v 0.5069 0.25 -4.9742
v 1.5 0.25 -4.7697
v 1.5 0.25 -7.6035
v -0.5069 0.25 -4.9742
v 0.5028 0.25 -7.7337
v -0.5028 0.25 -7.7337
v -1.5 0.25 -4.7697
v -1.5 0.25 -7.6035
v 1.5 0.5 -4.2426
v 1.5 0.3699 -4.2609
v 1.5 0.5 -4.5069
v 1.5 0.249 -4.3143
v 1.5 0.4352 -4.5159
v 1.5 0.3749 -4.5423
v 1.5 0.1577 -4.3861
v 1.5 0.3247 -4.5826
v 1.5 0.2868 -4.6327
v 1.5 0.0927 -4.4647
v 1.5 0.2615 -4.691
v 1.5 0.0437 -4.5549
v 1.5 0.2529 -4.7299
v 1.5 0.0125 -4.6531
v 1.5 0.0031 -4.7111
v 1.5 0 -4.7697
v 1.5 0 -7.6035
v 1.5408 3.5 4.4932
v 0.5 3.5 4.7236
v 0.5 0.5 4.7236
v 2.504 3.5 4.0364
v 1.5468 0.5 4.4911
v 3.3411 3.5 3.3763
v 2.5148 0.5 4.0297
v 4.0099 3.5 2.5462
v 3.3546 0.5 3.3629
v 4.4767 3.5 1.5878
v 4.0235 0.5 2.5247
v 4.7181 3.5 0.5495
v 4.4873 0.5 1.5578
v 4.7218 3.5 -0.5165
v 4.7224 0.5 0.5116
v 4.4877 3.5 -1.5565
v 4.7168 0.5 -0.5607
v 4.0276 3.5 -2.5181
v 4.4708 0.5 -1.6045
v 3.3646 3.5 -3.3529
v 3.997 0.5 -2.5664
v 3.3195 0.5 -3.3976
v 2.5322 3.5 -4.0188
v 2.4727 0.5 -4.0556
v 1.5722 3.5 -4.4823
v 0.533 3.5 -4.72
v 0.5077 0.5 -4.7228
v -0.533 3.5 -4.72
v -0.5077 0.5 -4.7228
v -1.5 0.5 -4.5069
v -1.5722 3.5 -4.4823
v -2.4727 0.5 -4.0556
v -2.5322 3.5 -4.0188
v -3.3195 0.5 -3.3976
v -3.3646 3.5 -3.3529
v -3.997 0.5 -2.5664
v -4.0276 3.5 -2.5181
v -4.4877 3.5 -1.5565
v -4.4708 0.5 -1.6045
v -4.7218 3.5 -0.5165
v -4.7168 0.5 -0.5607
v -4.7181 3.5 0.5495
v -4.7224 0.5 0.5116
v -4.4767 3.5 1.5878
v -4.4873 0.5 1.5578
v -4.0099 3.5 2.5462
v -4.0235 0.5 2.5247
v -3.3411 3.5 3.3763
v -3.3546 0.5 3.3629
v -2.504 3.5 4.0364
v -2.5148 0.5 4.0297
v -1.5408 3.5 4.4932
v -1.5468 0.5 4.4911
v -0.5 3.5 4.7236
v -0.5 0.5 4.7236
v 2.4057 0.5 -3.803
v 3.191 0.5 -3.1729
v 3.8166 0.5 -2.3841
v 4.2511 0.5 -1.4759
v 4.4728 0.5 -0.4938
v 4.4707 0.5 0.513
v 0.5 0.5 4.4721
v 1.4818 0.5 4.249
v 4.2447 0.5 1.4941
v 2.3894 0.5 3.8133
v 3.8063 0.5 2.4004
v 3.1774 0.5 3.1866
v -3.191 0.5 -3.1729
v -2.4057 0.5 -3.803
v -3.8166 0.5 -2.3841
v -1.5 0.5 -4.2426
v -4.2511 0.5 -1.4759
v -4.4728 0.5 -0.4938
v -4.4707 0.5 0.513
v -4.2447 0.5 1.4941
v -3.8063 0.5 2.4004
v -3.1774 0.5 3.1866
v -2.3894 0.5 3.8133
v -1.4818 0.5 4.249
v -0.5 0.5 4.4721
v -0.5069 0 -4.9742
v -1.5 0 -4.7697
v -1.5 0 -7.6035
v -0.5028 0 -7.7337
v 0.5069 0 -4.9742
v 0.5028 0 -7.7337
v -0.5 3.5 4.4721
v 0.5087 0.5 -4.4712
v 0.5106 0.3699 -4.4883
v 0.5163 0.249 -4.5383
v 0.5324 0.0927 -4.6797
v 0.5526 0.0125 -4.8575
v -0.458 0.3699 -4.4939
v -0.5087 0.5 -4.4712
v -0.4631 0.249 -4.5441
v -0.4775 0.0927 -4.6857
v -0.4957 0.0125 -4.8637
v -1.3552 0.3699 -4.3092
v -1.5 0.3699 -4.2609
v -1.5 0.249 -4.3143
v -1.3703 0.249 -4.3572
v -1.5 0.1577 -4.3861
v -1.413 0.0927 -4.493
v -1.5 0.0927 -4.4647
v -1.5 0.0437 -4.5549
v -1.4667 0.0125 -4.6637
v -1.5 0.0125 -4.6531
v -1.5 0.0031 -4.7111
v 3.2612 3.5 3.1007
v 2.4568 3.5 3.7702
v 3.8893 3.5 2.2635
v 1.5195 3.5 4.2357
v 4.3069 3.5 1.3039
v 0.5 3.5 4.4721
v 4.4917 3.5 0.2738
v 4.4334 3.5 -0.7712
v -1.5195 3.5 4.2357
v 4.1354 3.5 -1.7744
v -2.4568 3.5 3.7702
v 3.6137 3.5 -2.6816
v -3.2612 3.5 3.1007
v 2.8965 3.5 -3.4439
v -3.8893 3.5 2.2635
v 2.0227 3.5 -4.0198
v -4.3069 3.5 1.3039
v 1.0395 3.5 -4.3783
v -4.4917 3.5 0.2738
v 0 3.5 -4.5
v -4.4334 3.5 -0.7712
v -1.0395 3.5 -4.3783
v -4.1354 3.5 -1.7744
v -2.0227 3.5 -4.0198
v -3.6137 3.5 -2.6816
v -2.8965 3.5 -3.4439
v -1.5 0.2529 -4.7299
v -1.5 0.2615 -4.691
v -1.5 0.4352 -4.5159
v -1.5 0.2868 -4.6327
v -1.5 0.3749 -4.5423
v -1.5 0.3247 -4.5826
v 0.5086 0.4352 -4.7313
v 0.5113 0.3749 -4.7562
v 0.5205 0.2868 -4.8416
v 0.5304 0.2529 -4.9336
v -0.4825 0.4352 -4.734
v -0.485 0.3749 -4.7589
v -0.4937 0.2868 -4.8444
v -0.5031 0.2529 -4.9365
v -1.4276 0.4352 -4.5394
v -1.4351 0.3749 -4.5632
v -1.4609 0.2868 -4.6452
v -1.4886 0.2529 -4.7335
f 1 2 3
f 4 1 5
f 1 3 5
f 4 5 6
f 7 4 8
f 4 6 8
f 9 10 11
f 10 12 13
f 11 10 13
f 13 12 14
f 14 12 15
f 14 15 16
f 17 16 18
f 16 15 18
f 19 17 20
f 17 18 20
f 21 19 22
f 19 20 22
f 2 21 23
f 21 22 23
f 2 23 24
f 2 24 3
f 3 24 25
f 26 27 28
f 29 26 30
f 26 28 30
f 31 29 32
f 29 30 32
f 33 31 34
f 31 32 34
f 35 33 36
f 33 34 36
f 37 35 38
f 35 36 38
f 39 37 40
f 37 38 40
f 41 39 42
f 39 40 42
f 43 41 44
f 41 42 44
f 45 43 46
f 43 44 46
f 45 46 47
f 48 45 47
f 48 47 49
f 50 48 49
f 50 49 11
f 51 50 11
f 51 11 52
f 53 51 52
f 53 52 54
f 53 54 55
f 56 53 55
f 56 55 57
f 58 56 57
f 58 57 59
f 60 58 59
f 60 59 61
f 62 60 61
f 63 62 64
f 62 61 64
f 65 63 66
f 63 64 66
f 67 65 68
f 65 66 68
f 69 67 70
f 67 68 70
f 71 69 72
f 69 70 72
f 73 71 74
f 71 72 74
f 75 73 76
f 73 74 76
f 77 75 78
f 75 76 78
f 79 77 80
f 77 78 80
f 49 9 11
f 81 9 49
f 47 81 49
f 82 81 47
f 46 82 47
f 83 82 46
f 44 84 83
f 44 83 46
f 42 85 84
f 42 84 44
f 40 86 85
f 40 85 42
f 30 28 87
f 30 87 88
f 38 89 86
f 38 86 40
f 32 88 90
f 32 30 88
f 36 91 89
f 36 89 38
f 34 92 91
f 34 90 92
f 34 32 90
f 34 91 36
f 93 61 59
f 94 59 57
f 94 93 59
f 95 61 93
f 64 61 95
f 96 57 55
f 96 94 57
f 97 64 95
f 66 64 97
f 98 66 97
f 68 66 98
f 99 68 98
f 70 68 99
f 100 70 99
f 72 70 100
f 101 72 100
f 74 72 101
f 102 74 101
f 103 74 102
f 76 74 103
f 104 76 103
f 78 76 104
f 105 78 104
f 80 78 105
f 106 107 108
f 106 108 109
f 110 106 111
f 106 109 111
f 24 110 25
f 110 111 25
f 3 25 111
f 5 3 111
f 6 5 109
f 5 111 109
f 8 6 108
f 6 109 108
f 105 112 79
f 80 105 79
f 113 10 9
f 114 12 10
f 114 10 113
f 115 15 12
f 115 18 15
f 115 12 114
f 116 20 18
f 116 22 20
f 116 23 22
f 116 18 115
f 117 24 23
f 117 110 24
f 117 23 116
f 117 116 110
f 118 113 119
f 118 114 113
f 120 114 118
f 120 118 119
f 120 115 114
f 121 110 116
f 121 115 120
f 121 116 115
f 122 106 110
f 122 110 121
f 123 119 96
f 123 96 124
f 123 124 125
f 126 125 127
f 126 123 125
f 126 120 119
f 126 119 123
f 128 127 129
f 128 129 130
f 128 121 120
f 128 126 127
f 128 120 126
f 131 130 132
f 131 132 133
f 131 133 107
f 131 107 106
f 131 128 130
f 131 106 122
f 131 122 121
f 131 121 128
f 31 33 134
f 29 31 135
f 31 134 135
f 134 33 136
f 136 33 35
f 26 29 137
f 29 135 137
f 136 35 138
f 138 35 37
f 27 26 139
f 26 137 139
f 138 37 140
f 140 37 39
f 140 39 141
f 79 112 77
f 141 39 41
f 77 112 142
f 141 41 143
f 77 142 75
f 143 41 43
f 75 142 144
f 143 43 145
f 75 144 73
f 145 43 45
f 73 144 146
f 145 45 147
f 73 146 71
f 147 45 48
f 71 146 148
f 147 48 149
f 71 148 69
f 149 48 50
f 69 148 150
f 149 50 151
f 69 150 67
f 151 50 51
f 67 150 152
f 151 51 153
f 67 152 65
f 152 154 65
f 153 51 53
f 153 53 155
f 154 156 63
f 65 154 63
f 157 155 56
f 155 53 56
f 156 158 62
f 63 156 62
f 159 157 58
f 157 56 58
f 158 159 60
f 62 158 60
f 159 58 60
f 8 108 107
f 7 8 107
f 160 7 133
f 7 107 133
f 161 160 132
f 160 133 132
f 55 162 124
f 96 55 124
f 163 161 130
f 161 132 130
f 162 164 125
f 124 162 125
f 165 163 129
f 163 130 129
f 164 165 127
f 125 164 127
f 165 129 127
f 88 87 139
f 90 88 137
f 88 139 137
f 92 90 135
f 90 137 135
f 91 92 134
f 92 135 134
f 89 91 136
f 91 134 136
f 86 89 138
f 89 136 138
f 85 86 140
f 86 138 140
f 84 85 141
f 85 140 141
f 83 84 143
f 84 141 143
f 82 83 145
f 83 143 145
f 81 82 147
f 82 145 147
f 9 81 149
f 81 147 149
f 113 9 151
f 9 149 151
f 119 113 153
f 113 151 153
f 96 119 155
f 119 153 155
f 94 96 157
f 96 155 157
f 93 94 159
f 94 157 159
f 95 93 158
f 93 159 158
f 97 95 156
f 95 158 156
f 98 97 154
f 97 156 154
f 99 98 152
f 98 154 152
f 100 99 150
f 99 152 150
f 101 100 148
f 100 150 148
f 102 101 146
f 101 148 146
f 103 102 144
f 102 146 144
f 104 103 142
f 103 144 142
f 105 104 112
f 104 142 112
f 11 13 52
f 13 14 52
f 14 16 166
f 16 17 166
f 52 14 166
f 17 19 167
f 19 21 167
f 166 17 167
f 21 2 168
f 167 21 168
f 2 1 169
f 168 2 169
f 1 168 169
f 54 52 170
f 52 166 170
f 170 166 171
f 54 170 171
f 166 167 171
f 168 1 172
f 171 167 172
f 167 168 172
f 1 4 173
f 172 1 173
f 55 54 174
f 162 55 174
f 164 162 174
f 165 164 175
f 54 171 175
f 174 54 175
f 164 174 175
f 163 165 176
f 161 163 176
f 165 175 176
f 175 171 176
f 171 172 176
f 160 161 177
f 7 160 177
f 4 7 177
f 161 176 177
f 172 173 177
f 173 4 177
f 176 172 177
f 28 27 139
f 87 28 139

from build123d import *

# Parameters (mm, degrees)
CUT_EXTRUDE_1_DEPTH = 0.5
CUT_EXTRUDE_2_DEPTH = 4.5
FILLET_1_R          = 0.25
FILLET_2_R          = 0.5


with BuildPart() as part:
    # Эскиз1 → Повернуть1 (revolve)
    with BuildSketch(Plane.XY):
        Polygon((4.5, 0), (4.5, 3.5), (4.75, 3.5), (4.75, 0.25), (7.75, 0.25), (7.75, 0), align=None)
    revolve(axis=Axis((0, 0, 0), (0, 1, 0)))

    # Эскиз2 → Вырез-Вытянуть1 (cut)
    with BuildSketch(Plane.XZ):
        with BuildLine():
            Line((-1.5, -7.603453163), (-1.5, -2.4))
            Line((-1.5, -2.4), (1.5, -2.4))
            Line((1.5, -2.4), (1.5, -7.603453163))
            ThreePointArc((1.5, -7.603453163), (0, 7.75), (-1.5, -7.603453163))
        make_face()
    extrude(amount=-CUT_EXTRUDE_1_DEPTH, mode=Mode.SUBTRACT)

    # Эскиз3 → Вырез-Вытянуть2 (cut, through all)
    with BuildSketch(Plane(origin=(0, 3.5, 0), x_dir=(1, 0, 0), z_dir=(0, 1, 0))):
        with BuildLine():
            ThreePointArc((0.5, -4.472135955), (0, -4.5), (-0.5, -4.472135955))
            Line((-0.5, -4.472135955), (-0.5, -4.723610907))
            ThreePointArc((-0.5, -4.723610907), (0, -4.75), (0.5, -4.723610907))
            Line((0.5, -4.723610907), (0.5, -4.472135955))
        make_face()
    extrude(amount=-CUT_EXTRUDE_2_DEPTH, mode=Mode.SUBTRACT)

    # Скругление1
    fillet_1_edges = [part.edges().sort_by_distance(p)[0] for p in [
        (0, 0.25, -4.75),
    ]]
    fillet(fillet_1_edges, radius=FILLET_1_R)

    # Скругление2
    fillet_2_edges = [part.edges().sort_by_distance(p)[0] for p in [
        (0, 0, -4.5),
    ]]
    fillet(fillet_2_edges, radius=FILLET_2_R)


solid = part.part
